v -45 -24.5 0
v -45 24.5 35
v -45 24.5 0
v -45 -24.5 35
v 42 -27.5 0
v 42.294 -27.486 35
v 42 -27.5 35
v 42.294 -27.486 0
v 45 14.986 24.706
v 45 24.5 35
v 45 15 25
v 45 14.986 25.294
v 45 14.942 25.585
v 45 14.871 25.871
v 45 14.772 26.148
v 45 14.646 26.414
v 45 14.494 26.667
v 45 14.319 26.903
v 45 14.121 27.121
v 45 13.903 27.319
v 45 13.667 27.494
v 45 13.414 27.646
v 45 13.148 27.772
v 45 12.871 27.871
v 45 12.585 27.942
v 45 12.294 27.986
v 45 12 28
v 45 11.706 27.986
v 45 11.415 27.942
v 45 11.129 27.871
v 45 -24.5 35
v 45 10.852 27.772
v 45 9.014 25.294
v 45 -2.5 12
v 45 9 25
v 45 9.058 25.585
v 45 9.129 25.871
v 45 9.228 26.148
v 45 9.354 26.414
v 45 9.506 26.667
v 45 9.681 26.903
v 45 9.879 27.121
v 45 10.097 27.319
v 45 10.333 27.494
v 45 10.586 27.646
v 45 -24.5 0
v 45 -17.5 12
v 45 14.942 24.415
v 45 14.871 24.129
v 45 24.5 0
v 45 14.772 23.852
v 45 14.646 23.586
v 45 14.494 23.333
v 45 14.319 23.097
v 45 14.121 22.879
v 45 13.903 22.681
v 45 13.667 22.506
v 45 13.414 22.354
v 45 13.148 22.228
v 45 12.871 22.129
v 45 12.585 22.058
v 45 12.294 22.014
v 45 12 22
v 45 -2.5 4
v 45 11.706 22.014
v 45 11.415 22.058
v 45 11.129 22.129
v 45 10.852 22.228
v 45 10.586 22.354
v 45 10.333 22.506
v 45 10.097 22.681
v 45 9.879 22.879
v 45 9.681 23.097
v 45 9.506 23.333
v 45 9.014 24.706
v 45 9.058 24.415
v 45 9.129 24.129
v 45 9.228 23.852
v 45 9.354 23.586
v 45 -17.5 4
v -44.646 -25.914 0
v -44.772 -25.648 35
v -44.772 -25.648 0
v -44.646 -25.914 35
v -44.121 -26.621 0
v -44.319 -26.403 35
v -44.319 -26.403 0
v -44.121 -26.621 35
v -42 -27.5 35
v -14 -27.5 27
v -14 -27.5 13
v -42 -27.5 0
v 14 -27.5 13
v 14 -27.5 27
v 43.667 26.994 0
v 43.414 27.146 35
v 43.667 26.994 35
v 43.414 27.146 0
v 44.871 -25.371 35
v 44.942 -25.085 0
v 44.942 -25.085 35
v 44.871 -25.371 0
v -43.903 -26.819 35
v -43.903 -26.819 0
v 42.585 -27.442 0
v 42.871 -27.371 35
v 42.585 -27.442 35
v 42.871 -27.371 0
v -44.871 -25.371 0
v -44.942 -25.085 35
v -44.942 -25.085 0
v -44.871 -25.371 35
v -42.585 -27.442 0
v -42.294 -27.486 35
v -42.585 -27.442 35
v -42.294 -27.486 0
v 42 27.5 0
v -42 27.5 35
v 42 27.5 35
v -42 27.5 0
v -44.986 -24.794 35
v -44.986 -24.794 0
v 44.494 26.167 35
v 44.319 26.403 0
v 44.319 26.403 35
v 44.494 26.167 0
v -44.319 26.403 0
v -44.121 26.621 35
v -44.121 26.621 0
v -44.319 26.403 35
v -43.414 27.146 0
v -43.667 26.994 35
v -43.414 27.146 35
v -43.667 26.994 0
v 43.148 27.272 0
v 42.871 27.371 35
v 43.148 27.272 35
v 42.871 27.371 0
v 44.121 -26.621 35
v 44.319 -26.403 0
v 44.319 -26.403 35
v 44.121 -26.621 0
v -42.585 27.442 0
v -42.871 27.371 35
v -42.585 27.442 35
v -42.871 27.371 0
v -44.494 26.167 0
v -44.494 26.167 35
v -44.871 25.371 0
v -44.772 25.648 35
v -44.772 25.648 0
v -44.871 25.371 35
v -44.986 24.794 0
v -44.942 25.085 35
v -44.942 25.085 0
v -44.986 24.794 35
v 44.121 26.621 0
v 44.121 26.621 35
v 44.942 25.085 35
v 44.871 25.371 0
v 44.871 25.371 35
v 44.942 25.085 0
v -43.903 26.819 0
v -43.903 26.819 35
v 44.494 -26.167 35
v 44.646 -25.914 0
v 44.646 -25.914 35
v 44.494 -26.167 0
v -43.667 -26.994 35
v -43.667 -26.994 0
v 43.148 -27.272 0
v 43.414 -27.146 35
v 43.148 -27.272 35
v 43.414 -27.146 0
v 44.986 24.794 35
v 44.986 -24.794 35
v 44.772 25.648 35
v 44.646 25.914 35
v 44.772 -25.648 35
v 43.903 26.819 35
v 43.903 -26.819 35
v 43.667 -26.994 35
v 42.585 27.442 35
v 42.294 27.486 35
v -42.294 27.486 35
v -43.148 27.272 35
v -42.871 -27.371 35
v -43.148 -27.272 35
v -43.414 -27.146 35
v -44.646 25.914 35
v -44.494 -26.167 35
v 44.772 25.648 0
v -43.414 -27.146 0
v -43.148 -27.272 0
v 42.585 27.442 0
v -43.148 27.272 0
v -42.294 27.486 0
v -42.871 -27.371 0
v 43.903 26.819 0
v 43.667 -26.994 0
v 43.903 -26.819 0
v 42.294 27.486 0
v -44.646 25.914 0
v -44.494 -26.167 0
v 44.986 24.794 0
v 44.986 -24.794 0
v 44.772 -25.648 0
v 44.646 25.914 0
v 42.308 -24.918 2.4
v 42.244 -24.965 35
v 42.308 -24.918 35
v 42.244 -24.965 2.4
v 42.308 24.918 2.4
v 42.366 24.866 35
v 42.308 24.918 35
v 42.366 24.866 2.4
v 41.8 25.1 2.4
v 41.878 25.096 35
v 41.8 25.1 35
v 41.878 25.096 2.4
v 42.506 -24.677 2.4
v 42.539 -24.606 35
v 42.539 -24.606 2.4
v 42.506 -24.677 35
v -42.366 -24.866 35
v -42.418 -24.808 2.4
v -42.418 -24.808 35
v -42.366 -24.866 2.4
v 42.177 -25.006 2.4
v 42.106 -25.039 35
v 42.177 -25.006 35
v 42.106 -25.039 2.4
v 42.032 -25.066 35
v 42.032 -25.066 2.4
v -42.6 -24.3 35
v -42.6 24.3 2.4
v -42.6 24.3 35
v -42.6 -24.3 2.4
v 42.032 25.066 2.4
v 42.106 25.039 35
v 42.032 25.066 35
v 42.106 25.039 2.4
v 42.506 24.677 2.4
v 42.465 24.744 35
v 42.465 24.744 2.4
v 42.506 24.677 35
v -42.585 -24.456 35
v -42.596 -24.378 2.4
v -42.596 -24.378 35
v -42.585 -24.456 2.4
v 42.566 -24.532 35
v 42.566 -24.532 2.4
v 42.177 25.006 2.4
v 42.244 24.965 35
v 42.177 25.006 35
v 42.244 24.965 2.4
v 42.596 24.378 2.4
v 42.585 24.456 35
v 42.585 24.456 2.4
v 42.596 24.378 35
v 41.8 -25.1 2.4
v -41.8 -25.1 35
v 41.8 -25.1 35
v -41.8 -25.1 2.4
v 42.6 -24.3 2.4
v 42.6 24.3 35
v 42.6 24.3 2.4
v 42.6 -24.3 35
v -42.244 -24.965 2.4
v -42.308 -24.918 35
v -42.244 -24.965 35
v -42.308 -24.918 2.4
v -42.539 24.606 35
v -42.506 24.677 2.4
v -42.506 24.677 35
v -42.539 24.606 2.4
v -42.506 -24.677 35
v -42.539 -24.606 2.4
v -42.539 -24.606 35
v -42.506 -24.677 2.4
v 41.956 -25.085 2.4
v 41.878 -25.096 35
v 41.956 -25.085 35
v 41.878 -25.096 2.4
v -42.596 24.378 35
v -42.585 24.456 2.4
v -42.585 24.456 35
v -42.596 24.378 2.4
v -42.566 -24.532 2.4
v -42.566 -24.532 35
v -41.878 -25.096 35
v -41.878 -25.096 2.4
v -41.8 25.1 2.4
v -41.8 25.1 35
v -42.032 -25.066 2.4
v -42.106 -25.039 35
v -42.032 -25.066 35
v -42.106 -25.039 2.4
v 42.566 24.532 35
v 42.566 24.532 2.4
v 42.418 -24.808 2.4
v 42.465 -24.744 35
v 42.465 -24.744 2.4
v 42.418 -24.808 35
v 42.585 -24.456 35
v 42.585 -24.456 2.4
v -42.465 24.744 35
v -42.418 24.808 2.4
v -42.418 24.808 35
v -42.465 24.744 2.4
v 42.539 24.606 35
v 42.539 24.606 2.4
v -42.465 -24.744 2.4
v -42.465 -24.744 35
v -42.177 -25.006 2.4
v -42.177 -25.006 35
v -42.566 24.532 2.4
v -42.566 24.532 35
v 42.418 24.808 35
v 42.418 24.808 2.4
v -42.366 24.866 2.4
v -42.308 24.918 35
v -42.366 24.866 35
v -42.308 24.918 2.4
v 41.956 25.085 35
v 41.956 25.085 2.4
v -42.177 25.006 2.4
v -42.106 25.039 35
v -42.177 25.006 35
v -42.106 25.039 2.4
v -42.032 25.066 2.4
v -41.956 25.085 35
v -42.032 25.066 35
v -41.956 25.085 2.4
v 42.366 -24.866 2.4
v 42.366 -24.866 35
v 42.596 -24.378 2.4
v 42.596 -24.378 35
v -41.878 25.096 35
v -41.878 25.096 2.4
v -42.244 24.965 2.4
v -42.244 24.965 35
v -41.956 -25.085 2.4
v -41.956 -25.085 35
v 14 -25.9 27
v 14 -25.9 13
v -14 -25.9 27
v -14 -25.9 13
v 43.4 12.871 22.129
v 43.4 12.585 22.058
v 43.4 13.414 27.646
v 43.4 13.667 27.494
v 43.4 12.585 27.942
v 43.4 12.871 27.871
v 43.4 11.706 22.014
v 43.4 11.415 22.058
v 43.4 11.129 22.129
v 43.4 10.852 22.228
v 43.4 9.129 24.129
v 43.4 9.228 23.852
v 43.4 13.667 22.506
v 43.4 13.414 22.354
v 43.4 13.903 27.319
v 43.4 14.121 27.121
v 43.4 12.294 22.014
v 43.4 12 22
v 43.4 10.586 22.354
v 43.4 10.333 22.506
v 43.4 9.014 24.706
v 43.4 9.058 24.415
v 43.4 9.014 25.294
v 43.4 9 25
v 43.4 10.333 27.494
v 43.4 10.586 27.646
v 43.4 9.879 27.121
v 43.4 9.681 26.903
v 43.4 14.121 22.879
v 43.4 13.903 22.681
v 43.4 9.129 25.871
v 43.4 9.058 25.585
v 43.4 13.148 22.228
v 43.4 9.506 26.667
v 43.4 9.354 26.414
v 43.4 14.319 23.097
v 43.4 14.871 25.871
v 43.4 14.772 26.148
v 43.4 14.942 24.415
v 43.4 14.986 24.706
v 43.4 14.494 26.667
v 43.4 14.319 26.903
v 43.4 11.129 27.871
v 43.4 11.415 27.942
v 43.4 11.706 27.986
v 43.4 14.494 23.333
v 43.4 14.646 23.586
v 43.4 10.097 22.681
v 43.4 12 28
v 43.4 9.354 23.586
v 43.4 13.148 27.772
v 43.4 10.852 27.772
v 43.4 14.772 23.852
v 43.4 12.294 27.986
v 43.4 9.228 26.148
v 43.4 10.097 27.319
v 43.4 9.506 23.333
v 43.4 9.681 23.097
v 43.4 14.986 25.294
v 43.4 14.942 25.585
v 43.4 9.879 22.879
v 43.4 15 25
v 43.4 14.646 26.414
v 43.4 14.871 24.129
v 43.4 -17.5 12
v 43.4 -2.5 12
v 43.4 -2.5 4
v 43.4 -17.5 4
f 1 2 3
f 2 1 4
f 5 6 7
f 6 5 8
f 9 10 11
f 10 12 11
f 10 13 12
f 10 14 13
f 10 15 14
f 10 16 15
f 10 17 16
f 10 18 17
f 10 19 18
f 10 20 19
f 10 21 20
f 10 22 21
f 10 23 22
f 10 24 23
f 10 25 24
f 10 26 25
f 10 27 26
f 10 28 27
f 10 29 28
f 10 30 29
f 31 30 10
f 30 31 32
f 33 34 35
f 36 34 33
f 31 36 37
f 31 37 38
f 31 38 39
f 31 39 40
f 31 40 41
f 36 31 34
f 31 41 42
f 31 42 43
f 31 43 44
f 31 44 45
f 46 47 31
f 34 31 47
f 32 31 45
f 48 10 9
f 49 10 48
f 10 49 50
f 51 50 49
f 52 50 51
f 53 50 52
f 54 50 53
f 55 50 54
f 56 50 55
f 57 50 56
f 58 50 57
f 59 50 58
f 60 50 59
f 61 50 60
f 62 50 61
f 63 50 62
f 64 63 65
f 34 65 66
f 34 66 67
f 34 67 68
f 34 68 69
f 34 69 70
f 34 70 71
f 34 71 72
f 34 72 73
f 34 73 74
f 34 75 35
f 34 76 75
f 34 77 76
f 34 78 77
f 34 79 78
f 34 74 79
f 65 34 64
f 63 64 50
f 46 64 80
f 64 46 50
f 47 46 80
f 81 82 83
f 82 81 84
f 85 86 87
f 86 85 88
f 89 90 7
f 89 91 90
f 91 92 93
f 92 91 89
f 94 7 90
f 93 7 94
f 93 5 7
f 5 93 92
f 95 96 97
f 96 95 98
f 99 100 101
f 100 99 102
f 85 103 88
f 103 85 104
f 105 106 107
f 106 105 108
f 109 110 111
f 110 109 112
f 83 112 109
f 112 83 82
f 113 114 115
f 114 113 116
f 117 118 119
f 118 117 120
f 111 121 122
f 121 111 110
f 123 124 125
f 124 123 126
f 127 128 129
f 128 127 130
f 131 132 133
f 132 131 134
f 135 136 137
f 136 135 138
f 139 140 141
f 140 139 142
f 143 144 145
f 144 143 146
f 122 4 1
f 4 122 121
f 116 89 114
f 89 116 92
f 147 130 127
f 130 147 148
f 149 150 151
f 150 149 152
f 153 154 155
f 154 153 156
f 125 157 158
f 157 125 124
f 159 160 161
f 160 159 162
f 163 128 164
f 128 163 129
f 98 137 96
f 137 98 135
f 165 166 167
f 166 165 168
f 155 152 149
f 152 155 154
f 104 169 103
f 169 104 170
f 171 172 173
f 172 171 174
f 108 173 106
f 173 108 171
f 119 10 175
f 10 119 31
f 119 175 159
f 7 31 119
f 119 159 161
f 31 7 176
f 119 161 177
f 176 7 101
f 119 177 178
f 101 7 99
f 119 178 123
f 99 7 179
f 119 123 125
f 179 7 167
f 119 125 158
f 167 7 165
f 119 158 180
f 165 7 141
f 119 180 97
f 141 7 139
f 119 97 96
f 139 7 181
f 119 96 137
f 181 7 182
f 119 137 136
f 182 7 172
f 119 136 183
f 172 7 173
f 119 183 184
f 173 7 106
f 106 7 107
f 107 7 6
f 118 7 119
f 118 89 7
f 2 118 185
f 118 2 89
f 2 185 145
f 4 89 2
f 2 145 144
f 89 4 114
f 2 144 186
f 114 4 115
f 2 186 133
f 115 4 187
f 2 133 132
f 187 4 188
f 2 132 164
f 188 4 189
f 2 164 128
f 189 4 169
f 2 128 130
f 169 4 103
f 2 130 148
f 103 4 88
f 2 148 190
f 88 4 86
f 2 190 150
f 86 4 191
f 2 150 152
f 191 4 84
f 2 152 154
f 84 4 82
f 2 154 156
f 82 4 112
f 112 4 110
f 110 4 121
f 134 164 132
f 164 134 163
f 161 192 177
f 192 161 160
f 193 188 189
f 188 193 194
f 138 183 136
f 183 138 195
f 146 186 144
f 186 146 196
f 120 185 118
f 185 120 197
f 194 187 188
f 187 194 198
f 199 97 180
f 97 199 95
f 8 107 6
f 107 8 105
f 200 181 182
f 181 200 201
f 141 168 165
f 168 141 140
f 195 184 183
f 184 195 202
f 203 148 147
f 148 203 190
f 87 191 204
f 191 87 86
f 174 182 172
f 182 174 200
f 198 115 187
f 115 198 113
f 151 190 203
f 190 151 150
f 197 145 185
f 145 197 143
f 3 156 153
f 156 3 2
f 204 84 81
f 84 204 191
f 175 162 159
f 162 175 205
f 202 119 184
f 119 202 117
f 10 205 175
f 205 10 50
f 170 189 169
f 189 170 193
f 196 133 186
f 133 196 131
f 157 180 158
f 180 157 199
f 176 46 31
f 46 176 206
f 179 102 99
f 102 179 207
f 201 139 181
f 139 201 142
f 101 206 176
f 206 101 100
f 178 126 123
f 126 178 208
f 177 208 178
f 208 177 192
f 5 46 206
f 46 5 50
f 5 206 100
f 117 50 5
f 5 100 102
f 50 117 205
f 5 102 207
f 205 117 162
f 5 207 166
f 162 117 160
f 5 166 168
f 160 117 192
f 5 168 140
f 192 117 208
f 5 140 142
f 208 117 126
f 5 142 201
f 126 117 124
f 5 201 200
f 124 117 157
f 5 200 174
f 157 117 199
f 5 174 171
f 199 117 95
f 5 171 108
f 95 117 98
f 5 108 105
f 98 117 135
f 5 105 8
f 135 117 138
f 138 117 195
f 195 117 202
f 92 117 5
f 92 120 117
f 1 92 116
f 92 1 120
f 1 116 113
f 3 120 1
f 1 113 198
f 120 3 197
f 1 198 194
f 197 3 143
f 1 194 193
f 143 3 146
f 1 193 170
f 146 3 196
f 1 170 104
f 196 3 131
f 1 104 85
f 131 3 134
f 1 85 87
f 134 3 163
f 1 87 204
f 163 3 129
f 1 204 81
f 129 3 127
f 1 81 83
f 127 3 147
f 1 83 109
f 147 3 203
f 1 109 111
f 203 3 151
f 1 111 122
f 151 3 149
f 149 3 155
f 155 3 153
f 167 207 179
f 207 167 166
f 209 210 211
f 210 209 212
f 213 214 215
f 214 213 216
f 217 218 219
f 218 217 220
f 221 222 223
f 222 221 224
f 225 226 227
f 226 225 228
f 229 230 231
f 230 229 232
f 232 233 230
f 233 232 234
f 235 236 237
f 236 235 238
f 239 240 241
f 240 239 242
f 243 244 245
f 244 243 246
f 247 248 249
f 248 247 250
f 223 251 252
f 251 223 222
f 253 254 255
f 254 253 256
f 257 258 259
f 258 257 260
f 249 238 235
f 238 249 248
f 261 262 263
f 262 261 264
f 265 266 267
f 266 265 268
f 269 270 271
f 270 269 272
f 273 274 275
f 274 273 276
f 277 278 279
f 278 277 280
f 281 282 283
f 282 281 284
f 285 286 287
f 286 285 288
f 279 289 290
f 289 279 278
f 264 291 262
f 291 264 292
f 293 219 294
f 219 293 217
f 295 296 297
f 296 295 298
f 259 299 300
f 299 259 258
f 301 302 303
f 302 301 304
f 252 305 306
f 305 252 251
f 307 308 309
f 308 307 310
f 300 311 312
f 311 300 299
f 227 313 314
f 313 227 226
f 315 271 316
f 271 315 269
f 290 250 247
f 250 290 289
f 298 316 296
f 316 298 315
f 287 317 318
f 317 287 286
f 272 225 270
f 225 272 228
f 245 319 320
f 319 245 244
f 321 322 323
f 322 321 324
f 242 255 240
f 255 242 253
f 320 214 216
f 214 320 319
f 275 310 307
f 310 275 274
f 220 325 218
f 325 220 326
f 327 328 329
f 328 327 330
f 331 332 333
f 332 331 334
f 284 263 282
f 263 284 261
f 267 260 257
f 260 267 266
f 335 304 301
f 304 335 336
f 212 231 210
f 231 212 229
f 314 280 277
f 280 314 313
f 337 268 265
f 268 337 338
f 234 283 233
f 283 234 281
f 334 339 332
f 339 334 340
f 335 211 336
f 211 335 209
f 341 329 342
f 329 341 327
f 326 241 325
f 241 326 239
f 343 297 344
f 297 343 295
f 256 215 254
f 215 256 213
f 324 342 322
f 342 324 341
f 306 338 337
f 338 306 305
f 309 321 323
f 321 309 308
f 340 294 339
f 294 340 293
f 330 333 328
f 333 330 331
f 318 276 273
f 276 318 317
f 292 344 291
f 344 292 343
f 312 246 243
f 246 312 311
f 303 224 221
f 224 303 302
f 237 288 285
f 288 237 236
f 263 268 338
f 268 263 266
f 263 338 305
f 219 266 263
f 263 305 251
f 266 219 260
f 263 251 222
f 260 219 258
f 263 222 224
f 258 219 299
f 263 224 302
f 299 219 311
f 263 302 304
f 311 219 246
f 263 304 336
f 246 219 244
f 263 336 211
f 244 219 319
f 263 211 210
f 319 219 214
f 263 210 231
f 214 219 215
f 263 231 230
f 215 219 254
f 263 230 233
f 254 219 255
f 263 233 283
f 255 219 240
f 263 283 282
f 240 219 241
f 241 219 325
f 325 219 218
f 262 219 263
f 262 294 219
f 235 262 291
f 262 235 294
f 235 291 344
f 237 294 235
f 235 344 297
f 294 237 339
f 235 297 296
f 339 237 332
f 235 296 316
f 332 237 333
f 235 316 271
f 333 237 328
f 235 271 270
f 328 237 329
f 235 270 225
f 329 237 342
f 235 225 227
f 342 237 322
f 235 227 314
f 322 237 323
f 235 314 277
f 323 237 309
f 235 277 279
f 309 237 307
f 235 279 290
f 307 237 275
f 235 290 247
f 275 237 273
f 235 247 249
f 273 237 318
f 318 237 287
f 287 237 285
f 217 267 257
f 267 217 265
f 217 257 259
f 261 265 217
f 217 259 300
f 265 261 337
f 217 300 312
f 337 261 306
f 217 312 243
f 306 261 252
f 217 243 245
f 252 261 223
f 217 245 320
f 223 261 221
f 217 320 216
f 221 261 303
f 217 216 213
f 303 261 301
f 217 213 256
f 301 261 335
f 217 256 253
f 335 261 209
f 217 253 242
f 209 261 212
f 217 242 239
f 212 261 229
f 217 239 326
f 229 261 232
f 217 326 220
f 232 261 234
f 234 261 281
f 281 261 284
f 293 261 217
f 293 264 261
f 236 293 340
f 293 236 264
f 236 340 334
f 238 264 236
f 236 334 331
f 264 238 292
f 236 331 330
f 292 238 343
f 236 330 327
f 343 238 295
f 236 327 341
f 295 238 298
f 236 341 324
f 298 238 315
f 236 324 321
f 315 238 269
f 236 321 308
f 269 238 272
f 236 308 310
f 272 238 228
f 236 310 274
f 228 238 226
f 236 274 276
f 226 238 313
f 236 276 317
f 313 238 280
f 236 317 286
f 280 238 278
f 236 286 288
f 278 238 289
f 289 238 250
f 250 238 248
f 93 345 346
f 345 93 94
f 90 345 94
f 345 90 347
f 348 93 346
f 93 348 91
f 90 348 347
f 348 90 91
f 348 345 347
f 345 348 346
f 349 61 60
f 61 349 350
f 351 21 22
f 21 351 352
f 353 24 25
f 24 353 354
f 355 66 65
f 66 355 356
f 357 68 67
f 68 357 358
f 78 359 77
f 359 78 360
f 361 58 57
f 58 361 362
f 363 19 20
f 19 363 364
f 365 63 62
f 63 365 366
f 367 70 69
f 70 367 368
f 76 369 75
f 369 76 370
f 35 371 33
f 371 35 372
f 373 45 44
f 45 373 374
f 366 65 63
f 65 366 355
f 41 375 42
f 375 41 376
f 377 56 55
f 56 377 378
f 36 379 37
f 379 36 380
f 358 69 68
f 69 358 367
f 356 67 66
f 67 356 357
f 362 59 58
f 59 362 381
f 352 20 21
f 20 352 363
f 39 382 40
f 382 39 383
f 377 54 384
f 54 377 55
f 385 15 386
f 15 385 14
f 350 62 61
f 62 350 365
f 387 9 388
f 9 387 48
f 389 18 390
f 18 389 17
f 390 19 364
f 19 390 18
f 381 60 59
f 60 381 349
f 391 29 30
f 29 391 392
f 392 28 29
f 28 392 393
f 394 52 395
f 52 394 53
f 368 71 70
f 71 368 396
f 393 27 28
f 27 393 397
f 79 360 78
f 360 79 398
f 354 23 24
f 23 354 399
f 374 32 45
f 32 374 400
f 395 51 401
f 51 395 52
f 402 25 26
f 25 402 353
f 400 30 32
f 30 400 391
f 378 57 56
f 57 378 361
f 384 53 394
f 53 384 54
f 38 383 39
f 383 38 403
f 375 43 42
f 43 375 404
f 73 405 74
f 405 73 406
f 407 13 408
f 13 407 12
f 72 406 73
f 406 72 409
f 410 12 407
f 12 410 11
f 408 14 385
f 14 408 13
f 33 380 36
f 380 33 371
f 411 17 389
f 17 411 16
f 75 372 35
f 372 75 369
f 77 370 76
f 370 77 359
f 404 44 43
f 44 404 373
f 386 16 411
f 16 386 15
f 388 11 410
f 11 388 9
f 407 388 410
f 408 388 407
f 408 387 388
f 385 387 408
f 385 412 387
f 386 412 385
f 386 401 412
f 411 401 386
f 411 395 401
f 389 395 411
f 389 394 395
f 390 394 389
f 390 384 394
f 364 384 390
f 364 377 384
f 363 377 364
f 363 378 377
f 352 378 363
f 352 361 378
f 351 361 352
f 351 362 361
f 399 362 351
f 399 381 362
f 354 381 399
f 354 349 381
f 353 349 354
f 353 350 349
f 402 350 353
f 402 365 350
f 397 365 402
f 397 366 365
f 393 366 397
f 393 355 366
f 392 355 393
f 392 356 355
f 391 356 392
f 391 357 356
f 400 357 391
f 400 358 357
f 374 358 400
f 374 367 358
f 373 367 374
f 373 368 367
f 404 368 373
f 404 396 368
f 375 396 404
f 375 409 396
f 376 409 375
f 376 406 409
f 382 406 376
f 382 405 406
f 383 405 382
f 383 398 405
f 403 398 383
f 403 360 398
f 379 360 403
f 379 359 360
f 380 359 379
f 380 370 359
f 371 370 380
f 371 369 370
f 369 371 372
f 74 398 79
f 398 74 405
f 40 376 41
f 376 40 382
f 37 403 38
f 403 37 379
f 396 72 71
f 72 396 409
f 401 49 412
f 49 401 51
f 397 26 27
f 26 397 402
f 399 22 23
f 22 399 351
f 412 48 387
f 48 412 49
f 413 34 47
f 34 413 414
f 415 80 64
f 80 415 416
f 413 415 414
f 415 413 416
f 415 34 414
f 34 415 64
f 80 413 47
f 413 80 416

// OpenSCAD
// ESP32 Mini Smart Desk Monitor — generic enclosure reference
// This is a starting point, not a measured model of any photographed device.
// Check your exact OLED module, ESP32 board, sensor, and USB connector before printing.
// Units: millimetres.

$fn = 64;

outer_w = 90;
outer_d = 55;
outer_h = 35;
wall = 2.4;
corner_r = 3;

// Approximate display opening for a small 128x64 OLED module.
display_opening_w = 28;
display_opening_h = 14;
display_center_z = 20;

// Side openings; verify against the chosen sensor/module/USB connector.
sensor_hole_d = 6;
sensor_hole_y = 12;
sensor_hole_z = 25;
usb_opening_w = 15; // along Y
usb_opening_h = 8;  // along Z
usb_opening_y = -10;
usb_opening_z = 8;

module rounded_box(w, d, h, r) {
    minkowski() {
        cube([w - 2*r, d - 2*r, h - 2*r], center=true);
        cylinder(r=r, h=2*r, center=true);
    }
}

difference() {
    // Outer shell, with a bottom at Z=0.
    translate([0, 0, outer_h/2])
        rounded_box(outer_w, outer_d, outer_h, corner_r);

    // Hollow interior; leaves the specified bottom wall and is open at the top.
    translate([0, 0, wall + (outer_h-wall)/2])
        rounded_box(outer_w-2*wall, outer_d-2*wall, outer_h-wall,
                    max(0.8, corner_r-wall));

    // OLED window on the front (negative-Y) face.
    translate([0, -outer_d/2-0.1, display_center_z])
        cube([display_opening_w, wall+1, display_opening_h], center=true);

    // Side opening for an external temperature/humidity sensor.
    translate([outer_w/2+0.1, sensor_hole_y, sensor_hole_z])
        rotate([0, 90, 0])
            cylinder(d=sensor_hole_d, h=wall+1, center=true);

    // USB access on the right-hand side.
    translate([outer_w/2+0.1, usb_opening_y, usb_opening_z])
        cube([wall+1, usb_opening_w, usb_opening_h], center=true);
}
